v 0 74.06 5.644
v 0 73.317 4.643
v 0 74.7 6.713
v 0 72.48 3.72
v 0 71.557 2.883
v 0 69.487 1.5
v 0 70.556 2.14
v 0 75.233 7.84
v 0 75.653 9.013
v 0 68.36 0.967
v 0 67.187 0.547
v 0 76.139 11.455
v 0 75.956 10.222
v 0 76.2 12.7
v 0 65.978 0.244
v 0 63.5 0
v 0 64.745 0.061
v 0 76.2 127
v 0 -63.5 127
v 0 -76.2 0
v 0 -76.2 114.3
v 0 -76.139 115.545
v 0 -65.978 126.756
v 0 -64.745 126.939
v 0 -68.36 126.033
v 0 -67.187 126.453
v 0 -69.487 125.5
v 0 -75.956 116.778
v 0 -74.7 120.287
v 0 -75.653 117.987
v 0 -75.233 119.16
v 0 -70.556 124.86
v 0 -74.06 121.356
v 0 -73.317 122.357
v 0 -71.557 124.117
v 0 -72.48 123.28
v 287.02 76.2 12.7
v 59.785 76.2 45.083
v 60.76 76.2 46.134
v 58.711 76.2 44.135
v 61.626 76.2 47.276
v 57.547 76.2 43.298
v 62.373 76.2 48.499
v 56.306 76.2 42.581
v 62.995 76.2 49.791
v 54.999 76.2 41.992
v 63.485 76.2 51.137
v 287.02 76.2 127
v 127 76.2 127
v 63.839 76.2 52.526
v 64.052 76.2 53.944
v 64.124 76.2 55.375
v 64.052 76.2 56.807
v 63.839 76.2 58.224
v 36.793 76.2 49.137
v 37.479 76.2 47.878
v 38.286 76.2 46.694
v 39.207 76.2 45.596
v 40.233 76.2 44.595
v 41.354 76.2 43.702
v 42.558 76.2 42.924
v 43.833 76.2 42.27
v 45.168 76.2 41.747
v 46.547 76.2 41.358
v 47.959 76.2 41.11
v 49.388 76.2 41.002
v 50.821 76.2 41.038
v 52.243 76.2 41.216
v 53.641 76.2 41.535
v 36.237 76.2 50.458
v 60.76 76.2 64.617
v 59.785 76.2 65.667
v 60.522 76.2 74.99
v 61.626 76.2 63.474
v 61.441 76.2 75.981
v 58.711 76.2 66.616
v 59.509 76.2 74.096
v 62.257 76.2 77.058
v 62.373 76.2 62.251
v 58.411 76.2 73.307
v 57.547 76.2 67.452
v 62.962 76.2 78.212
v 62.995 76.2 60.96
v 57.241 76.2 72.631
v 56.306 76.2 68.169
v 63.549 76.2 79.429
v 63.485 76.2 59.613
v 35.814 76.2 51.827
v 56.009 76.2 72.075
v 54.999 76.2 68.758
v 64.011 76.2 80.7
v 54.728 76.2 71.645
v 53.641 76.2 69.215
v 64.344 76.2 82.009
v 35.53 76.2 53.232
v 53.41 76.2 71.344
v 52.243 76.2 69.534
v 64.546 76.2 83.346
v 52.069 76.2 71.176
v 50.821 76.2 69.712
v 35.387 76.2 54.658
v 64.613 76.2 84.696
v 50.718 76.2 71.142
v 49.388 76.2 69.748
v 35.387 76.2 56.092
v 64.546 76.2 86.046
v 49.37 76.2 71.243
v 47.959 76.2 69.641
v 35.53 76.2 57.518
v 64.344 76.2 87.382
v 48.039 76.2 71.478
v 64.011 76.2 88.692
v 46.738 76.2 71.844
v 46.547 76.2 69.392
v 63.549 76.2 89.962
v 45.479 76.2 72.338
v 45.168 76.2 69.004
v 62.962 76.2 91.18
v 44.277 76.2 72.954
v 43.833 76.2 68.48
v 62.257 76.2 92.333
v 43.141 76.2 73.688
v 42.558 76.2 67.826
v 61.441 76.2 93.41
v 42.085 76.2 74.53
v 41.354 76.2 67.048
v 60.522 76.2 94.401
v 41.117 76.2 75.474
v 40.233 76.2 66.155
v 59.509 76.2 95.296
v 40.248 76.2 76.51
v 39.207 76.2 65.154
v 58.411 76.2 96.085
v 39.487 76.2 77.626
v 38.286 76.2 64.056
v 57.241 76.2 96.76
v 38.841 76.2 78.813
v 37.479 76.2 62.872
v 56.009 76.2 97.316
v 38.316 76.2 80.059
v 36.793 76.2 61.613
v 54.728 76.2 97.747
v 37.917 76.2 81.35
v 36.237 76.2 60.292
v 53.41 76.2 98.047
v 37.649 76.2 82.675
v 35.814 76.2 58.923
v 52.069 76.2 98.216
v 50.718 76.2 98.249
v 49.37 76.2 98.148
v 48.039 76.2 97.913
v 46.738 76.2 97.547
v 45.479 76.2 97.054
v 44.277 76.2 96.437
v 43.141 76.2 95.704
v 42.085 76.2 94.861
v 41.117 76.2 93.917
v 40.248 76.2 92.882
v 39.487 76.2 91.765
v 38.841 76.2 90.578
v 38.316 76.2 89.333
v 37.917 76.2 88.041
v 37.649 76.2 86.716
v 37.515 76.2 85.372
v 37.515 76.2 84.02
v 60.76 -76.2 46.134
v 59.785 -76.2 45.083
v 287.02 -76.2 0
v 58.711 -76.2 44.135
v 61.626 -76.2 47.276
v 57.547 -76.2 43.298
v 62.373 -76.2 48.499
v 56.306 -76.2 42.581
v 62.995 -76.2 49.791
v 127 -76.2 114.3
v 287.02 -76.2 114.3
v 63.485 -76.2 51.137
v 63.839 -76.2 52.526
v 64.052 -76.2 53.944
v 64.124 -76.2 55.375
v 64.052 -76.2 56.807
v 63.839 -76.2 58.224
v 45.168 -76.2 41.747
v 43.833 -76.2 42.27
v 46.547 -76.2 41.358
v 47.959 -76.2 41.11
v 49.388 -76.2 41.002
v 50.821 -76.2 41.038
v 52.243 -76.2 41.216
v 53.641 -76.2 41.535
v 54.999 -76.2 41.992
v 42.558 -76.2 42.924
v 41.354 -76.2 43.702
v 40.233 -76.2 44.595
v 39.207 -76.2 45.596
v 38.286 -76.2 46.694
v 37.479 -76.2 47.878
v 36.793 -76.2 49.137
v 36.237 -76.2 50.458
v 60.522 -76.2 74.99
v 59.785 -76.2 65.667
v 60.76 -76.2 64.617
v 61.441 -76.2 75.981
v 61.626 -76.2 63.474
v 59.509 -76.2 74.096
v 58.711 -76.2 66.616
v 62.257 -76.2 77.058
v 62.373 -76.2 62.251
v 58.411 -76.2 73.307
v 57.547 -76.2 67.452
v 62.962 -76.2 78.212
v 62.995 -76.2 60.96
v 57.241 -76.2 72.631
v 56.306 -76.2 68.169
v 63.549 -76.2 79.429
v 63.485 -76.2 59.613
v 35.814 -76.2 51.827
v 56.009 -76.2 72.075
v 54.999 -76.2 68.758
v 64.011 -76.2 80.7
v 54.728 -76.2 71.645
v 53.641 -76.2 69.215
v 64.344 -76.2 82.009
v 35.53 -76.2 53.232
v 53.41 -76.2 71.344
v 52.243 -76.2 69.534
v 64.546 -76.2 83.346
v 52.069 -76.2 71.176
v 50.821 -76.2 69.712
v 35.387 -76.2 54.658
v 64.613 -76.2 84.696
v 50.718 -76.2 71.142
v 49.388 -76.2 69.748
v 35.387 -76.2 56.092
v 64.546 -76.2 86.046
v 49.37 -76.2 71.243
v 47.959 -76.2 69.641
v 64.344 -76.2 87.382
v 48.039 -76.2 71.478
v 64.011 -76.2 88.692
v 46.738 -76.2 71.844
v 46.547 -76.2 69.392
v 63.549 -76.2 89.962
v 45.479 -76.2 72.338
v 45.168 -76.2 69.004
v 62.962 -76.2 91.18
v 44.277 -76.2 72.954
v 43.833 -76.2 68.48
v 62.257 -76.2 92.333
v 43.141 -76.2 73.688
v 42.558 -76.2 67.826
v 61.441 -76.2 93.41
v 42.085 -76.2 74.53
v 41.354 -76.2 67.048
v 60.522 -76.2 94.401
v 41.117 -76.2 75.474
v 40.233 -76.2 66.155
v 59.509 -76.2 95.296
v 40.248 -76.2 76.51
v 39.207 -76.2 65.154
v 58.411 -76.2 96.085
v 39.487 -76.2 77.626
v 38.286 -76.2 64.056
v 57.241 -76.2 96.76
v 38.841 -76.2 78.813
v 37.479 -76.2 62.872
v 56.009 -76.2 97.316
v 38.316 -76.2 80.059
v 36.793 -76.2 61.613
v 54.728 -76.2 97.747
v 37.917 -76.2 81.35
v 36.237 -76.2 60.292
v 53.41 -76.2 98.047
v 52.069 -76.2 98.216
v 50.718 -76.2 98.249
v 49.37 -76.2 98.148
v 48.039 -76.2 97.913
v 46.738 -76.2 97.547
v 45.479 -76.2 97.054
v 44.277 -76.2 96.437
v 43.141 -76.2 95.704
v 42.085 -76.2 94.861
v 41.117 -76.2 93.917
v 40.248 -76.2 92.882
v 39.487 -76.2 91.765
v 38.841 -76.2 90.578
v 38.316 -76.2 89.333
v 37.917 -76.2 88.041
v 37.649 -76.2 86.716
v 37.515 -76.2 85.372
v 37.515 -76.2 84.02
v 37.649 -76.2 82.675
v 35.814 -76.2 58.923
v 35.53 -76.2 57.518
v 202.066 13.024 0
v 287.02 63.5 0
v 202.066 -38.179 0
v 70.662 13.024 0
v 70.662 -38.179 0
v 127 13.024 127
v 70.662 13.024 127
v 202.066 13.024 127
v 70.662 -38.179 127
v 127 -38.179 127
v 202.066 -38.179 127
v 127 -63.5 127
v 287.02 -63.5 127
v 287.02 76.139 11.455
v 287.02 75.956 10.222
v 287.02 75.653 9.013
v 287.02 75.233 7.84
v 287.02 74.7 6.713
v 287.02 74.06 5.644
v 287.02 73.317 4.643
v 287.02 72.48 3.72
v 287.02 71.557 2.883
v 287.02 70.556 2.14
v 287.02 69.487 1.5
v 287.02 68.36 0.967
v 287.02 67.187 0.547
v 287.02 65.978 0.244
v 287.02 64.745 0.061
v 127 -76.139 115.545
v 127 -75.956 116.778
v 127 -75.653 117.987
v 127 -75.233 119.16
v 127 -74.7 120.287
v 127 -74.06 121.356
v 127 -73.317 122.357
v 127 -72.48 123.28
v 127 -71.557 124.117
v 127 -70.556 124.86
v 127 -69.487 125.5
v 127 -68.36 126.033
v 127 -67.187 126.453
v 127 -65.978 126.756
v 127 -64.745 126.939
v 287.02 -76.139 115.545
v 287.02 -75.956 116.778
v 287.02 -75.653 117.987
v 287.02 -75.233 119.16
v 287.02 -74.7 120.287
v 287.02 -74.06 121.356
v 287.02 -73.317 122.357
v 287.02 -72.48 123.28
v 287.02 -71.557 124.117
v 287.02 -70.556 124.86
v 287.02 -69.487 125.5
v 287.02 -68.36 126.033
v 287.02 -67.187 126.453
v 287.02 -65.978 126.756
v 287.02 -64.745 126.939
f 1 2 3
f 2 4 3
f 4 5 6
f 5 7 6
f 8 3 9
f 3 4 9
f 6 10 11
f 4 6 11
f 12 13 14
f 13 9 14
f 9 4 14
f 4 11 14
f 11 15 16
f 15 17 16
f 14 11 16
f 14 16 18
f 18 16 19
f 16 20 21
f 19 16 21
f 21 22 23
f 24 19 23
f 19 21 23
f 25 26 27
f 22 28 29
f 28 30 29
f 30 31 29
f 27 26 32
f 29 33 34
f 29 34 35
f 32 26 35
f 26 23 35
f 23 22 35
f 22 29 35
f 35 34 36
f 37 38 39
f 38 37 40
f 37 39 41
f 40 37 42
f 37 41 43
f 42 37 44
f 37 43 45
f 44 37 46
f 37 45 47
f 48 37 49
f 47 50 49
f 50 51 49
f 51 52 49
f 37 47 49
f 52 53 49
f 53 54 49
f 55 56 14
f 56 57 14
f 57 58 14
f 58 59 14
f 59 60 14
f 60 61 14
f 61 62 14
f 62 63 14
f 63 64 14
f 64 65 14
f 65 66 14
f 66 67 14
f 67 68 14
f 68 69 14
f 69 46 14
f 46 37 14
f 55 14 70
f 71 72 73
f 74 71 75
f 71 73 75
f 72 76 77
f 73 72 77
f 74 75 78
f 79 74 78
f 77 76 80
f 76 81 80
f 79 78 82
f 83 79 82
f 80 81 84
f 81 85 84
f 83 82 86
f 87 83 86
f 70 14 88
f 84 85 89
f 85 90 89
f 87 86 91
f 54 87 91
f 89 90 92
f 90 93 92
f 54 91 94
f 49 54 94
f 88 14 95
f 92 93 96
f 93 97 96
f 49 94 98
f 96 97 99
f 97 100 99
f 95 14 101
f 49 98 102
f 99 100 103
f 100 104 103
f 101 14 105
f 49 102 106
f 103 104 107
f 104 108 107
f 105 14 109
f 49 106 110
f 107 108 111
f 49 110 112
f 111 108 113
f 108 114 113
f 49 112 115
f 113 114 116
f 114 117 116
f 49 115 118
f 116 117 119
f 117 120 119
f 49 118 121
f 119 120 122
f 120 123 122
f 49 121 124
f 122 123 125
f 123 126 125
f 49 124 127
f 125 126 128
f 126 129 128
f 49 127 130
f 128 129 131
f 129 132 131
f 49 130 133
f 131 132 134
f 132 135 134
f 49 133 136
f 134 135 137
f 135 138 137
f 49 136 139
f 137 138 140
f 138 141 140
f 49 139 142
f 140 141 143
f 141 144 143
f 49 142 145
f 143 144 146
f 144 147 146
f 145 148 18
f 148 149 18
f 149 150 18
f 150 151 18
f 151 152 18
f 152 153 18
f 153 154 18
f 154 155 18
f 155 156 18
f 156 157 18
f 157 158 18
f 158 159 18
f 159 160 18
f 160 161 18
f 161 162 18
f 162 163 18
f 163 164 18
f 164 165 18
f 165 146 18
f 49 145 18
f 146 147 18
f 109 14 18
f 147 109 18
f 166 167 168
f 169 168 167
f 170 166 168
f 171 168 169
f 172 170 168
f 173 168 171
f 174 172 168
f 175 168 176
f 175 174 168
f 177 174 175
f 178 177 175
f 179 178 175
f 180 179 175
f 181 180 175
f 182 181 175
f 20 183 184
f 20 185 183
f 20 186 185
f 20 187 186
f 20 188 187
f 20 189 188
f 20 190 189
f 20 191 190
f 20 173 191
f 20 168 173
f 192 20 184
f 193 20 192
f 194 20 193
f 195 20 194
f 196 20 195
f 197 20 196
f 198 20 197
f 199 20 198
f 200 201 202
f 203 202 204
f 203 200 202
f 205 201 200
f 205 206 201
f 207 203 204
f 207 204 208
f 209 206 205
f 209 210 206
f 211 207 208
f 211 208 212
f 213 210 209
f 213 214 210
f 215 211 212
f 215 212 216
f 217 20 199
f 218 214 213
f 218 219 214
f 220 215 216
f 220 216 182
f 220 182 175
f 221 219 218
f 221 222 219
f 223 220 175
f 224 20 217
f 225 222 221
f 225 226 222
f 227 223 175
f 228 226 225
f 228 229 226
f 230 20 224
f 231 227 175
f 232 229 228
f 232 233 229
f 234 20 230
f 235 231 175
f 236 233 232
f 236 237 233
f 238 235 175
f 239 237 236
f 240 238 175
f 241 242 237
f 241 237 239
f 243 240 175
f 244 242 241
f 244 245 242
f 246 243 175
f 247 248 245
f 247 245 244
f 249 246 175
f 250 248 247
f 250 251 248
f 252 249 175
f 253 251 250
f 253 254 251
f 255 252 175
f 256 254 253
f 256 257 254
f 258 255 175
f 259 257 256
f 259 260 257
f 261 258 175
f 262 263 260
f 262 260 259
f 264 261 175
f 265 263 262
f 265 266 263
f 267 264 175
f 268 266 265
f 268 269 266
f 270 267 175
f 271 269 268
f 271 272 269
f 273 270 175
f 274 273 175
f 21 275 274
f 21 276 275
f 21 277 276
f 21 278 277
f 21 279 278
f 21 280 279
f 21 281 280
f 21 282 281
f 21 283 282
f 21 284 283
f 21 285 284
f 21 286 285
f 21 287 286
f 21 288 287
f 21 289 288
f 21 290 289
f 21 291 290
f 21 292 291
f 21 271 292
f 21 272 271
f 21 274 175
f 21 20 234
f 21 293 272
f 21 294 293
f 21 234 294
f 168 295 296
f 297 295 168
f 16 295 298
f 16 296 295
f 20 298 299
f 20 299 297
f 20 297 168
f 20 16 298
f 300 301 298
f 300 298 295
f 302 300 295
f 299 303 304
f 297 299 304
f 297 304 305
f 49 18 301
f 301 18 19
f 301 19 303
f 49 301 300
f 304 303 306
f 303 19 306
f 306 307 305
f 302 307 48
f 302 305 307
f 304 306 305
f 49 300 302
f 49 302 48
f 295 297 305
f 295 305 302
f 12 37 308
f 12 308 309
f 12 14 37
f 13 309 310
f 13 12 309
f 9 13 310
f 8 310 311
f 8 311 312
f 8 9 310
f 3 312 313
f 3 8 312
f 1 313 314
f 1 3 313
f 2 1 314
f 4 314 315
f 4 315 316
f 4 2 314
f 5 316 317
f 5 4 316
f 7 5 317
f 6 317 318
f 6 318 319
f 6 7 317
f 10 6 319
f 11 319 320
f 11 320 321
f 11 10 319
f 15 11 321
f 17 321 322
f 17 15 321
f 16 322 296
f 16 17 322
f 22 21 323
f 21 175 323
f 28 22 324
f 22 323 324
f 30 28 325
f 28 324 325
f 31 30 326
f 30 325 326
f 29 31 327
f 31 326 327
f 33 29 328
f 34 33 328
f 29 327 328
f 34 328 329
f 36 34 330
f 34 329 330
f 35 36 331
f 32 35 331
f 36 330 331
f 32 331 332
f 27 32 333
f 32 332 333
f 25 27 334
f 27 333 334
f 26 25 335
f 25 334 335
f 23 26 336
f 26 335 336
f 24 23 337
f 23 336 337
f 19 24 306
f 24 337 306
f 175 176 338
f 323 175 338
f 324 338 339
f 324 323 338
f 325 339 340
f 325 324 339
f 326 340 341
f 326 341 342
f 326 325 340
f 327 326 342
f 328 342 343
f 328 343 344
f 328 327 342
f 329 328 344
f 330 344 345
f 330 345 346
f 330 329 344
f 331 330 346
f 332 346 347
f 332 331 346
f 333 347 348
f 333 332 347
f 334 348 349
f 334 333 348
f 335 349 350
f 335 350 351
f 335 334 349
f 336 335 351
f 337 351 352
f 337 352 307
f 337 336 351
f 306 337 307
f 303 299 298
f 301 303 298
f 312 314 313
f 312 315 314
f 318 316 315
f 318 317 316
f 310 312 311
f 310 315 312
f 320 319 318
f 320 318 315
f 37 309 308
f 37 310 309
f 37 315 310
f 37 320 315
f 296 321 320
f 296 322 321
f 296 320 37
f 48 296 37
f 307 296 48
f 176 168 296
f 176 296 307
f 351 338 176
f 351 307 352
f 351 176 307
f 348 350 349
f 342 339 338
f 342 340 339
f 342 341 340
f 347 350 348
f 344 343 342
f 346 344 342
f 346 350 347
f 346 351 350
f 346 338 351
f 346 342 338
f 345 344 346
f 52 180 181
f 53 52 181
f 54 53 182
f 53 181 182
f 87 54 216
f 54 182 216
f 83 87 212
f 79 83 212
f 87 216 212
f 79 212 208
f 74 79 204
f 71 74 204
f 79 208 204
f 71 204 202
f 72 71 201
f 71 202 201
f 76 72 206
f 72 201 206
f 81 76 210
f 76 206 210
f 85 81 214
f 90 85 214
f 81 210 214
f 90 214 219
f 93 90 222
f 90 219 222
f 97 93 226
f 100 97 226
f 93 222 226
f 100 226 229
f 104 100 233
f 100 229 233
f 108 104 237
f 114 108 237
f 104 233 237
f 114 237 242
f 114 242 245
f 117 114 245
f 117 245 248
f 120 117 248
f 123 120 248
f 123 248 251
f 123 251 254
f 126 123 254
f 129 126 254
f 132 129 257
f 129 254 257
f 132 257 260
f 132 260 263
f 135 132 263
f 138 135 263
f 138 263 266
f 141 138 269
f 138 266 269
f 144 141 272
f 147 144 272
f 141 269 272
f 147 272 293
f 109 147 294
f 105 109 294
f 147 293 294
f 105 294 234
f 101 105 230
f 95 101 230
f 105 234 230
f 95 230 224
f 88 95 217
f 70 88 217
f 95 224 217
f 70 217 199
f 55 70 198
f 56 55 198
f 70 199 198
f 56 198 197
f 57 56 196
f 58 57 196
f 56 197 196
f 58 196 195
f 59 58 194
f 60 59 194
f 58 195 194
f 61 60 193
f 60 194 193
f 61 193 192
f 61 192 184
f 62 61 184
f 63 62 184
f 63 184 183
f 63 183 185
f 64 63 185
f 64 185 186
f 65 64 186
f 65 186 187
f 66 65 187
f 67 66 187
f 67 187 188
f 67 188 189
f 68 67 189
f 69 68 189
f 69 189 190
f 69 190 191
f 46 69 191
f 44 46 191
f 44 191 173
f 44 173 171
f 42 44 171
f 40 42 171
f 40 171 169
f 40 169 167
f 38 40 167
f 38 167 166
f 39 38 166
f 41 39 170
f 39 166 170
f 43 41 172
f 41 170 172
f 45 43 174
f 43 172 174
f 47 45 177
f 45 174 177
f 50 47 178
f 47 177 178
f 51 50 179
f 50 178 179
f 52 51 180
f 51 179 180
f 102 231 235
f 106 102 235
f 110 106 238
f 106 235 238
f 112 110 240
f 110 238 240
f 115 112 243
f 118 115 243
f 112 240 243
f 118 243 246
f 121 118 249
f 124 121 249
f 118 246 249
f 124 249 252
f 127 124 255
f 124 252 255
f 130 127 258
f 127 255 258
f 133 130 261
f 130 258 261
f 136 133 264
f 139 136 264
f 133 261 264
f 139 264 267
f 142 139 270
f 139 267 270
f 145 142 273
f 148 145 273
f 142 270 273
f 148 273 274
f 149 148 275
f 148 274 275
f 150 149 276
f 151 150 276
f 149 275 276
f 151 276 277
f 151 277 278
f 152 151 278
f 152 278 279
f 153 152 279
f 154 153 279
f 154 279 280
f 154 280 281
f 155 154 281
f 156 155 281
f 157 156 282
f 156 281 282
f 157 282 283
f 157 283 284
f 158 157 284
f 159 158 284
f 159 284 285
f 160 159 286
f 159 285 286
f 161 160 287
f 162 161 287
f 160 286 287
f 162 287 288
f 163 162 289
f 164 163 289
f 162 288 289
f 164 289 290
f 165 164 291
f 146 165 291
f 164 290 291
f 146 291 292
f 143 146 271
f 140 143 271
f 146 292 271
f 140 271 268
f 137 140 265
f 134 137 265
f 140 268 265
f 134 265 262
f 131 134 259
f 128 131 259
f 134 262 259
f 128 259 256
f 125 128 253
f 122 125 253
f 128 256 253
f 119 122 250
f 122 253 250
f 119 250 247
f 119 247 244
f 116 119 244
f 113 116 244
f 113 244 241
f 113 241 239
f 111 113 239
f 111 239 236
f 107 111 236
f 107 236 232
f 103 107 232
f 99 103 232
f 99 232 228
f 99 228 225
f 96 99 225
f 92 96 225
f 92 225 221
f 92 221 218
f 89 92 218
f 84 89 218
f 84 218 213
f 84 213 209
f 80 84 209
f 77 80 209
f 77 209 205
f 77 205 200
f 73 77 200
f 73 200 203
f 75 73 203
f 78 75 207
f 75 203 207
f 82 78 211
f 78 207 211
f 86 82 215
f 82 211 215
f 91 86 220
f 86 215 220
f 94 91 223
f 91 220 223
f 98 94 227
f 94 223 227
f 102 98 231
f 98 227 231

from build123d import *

# Parameters (mm, degrees)
F0_W     = 127
F0_H     = 127
F1_DEPTH = 76.2
F2_R     = 12.7
F3_R     = 13.5576573184
F3_R_2   = 14.3770911371
F4_DEPTH = 152.4
F5_DEPTH = 160.02
F6_W     = 131.4042881131
F6_H     = 51.2029398233
F7_DEPTH = 211.836


with BuildPart() as f1:
    # F0 (on Front) → F1 (new body, symmetric)
    with BuildSketch(Plane.XZ):
        with Locations((63.5, 63.5)):
            Rectangle(F0_W, F0_H)
    extrude(amount=F1_DEPTH, both=True)

    # F2
    f2_edges = [f1.edges().sort_by_distance(p)[0] for p in [
        (63.5, -76.2, 127),
        (63.5, 76.2, 0),
    ]]
    fillet(f2_edges, radius=F2_R)

    # F3 (on face) → F4 (cut, through all)
    with BuildSketch(Plane.XZ.offset(76.2)):
        with Locations((51.0555580258, 84.6957564354)):
            Circle(F3_R)
        with Locations((49.7466027737, 55.3751178086)):
            Circle(F3_R_2)
    extrude(amount=-F4_DEPTH, mode=Mode.SUBTRACT)

    # F5 (add): a face of the model
    f5_faces = [f1.faces().sort_by_distance(p)[0] for p in [
        (127, 0, 63.5),
    ]]
    extrude(f5_faces, amount=F5_DEPTH)

    # F6 (on face) → F7 (cut)
    with BuildSketch(Plane.XY.offset(127)):
        with Locations((136.3636963069, -12.5774694607)):
            Rectangle(F6_W, F6_H)
    extrude(amount=-F7_DEPTH, mode=Mode.SUBTRACT)


solid = f1.part
